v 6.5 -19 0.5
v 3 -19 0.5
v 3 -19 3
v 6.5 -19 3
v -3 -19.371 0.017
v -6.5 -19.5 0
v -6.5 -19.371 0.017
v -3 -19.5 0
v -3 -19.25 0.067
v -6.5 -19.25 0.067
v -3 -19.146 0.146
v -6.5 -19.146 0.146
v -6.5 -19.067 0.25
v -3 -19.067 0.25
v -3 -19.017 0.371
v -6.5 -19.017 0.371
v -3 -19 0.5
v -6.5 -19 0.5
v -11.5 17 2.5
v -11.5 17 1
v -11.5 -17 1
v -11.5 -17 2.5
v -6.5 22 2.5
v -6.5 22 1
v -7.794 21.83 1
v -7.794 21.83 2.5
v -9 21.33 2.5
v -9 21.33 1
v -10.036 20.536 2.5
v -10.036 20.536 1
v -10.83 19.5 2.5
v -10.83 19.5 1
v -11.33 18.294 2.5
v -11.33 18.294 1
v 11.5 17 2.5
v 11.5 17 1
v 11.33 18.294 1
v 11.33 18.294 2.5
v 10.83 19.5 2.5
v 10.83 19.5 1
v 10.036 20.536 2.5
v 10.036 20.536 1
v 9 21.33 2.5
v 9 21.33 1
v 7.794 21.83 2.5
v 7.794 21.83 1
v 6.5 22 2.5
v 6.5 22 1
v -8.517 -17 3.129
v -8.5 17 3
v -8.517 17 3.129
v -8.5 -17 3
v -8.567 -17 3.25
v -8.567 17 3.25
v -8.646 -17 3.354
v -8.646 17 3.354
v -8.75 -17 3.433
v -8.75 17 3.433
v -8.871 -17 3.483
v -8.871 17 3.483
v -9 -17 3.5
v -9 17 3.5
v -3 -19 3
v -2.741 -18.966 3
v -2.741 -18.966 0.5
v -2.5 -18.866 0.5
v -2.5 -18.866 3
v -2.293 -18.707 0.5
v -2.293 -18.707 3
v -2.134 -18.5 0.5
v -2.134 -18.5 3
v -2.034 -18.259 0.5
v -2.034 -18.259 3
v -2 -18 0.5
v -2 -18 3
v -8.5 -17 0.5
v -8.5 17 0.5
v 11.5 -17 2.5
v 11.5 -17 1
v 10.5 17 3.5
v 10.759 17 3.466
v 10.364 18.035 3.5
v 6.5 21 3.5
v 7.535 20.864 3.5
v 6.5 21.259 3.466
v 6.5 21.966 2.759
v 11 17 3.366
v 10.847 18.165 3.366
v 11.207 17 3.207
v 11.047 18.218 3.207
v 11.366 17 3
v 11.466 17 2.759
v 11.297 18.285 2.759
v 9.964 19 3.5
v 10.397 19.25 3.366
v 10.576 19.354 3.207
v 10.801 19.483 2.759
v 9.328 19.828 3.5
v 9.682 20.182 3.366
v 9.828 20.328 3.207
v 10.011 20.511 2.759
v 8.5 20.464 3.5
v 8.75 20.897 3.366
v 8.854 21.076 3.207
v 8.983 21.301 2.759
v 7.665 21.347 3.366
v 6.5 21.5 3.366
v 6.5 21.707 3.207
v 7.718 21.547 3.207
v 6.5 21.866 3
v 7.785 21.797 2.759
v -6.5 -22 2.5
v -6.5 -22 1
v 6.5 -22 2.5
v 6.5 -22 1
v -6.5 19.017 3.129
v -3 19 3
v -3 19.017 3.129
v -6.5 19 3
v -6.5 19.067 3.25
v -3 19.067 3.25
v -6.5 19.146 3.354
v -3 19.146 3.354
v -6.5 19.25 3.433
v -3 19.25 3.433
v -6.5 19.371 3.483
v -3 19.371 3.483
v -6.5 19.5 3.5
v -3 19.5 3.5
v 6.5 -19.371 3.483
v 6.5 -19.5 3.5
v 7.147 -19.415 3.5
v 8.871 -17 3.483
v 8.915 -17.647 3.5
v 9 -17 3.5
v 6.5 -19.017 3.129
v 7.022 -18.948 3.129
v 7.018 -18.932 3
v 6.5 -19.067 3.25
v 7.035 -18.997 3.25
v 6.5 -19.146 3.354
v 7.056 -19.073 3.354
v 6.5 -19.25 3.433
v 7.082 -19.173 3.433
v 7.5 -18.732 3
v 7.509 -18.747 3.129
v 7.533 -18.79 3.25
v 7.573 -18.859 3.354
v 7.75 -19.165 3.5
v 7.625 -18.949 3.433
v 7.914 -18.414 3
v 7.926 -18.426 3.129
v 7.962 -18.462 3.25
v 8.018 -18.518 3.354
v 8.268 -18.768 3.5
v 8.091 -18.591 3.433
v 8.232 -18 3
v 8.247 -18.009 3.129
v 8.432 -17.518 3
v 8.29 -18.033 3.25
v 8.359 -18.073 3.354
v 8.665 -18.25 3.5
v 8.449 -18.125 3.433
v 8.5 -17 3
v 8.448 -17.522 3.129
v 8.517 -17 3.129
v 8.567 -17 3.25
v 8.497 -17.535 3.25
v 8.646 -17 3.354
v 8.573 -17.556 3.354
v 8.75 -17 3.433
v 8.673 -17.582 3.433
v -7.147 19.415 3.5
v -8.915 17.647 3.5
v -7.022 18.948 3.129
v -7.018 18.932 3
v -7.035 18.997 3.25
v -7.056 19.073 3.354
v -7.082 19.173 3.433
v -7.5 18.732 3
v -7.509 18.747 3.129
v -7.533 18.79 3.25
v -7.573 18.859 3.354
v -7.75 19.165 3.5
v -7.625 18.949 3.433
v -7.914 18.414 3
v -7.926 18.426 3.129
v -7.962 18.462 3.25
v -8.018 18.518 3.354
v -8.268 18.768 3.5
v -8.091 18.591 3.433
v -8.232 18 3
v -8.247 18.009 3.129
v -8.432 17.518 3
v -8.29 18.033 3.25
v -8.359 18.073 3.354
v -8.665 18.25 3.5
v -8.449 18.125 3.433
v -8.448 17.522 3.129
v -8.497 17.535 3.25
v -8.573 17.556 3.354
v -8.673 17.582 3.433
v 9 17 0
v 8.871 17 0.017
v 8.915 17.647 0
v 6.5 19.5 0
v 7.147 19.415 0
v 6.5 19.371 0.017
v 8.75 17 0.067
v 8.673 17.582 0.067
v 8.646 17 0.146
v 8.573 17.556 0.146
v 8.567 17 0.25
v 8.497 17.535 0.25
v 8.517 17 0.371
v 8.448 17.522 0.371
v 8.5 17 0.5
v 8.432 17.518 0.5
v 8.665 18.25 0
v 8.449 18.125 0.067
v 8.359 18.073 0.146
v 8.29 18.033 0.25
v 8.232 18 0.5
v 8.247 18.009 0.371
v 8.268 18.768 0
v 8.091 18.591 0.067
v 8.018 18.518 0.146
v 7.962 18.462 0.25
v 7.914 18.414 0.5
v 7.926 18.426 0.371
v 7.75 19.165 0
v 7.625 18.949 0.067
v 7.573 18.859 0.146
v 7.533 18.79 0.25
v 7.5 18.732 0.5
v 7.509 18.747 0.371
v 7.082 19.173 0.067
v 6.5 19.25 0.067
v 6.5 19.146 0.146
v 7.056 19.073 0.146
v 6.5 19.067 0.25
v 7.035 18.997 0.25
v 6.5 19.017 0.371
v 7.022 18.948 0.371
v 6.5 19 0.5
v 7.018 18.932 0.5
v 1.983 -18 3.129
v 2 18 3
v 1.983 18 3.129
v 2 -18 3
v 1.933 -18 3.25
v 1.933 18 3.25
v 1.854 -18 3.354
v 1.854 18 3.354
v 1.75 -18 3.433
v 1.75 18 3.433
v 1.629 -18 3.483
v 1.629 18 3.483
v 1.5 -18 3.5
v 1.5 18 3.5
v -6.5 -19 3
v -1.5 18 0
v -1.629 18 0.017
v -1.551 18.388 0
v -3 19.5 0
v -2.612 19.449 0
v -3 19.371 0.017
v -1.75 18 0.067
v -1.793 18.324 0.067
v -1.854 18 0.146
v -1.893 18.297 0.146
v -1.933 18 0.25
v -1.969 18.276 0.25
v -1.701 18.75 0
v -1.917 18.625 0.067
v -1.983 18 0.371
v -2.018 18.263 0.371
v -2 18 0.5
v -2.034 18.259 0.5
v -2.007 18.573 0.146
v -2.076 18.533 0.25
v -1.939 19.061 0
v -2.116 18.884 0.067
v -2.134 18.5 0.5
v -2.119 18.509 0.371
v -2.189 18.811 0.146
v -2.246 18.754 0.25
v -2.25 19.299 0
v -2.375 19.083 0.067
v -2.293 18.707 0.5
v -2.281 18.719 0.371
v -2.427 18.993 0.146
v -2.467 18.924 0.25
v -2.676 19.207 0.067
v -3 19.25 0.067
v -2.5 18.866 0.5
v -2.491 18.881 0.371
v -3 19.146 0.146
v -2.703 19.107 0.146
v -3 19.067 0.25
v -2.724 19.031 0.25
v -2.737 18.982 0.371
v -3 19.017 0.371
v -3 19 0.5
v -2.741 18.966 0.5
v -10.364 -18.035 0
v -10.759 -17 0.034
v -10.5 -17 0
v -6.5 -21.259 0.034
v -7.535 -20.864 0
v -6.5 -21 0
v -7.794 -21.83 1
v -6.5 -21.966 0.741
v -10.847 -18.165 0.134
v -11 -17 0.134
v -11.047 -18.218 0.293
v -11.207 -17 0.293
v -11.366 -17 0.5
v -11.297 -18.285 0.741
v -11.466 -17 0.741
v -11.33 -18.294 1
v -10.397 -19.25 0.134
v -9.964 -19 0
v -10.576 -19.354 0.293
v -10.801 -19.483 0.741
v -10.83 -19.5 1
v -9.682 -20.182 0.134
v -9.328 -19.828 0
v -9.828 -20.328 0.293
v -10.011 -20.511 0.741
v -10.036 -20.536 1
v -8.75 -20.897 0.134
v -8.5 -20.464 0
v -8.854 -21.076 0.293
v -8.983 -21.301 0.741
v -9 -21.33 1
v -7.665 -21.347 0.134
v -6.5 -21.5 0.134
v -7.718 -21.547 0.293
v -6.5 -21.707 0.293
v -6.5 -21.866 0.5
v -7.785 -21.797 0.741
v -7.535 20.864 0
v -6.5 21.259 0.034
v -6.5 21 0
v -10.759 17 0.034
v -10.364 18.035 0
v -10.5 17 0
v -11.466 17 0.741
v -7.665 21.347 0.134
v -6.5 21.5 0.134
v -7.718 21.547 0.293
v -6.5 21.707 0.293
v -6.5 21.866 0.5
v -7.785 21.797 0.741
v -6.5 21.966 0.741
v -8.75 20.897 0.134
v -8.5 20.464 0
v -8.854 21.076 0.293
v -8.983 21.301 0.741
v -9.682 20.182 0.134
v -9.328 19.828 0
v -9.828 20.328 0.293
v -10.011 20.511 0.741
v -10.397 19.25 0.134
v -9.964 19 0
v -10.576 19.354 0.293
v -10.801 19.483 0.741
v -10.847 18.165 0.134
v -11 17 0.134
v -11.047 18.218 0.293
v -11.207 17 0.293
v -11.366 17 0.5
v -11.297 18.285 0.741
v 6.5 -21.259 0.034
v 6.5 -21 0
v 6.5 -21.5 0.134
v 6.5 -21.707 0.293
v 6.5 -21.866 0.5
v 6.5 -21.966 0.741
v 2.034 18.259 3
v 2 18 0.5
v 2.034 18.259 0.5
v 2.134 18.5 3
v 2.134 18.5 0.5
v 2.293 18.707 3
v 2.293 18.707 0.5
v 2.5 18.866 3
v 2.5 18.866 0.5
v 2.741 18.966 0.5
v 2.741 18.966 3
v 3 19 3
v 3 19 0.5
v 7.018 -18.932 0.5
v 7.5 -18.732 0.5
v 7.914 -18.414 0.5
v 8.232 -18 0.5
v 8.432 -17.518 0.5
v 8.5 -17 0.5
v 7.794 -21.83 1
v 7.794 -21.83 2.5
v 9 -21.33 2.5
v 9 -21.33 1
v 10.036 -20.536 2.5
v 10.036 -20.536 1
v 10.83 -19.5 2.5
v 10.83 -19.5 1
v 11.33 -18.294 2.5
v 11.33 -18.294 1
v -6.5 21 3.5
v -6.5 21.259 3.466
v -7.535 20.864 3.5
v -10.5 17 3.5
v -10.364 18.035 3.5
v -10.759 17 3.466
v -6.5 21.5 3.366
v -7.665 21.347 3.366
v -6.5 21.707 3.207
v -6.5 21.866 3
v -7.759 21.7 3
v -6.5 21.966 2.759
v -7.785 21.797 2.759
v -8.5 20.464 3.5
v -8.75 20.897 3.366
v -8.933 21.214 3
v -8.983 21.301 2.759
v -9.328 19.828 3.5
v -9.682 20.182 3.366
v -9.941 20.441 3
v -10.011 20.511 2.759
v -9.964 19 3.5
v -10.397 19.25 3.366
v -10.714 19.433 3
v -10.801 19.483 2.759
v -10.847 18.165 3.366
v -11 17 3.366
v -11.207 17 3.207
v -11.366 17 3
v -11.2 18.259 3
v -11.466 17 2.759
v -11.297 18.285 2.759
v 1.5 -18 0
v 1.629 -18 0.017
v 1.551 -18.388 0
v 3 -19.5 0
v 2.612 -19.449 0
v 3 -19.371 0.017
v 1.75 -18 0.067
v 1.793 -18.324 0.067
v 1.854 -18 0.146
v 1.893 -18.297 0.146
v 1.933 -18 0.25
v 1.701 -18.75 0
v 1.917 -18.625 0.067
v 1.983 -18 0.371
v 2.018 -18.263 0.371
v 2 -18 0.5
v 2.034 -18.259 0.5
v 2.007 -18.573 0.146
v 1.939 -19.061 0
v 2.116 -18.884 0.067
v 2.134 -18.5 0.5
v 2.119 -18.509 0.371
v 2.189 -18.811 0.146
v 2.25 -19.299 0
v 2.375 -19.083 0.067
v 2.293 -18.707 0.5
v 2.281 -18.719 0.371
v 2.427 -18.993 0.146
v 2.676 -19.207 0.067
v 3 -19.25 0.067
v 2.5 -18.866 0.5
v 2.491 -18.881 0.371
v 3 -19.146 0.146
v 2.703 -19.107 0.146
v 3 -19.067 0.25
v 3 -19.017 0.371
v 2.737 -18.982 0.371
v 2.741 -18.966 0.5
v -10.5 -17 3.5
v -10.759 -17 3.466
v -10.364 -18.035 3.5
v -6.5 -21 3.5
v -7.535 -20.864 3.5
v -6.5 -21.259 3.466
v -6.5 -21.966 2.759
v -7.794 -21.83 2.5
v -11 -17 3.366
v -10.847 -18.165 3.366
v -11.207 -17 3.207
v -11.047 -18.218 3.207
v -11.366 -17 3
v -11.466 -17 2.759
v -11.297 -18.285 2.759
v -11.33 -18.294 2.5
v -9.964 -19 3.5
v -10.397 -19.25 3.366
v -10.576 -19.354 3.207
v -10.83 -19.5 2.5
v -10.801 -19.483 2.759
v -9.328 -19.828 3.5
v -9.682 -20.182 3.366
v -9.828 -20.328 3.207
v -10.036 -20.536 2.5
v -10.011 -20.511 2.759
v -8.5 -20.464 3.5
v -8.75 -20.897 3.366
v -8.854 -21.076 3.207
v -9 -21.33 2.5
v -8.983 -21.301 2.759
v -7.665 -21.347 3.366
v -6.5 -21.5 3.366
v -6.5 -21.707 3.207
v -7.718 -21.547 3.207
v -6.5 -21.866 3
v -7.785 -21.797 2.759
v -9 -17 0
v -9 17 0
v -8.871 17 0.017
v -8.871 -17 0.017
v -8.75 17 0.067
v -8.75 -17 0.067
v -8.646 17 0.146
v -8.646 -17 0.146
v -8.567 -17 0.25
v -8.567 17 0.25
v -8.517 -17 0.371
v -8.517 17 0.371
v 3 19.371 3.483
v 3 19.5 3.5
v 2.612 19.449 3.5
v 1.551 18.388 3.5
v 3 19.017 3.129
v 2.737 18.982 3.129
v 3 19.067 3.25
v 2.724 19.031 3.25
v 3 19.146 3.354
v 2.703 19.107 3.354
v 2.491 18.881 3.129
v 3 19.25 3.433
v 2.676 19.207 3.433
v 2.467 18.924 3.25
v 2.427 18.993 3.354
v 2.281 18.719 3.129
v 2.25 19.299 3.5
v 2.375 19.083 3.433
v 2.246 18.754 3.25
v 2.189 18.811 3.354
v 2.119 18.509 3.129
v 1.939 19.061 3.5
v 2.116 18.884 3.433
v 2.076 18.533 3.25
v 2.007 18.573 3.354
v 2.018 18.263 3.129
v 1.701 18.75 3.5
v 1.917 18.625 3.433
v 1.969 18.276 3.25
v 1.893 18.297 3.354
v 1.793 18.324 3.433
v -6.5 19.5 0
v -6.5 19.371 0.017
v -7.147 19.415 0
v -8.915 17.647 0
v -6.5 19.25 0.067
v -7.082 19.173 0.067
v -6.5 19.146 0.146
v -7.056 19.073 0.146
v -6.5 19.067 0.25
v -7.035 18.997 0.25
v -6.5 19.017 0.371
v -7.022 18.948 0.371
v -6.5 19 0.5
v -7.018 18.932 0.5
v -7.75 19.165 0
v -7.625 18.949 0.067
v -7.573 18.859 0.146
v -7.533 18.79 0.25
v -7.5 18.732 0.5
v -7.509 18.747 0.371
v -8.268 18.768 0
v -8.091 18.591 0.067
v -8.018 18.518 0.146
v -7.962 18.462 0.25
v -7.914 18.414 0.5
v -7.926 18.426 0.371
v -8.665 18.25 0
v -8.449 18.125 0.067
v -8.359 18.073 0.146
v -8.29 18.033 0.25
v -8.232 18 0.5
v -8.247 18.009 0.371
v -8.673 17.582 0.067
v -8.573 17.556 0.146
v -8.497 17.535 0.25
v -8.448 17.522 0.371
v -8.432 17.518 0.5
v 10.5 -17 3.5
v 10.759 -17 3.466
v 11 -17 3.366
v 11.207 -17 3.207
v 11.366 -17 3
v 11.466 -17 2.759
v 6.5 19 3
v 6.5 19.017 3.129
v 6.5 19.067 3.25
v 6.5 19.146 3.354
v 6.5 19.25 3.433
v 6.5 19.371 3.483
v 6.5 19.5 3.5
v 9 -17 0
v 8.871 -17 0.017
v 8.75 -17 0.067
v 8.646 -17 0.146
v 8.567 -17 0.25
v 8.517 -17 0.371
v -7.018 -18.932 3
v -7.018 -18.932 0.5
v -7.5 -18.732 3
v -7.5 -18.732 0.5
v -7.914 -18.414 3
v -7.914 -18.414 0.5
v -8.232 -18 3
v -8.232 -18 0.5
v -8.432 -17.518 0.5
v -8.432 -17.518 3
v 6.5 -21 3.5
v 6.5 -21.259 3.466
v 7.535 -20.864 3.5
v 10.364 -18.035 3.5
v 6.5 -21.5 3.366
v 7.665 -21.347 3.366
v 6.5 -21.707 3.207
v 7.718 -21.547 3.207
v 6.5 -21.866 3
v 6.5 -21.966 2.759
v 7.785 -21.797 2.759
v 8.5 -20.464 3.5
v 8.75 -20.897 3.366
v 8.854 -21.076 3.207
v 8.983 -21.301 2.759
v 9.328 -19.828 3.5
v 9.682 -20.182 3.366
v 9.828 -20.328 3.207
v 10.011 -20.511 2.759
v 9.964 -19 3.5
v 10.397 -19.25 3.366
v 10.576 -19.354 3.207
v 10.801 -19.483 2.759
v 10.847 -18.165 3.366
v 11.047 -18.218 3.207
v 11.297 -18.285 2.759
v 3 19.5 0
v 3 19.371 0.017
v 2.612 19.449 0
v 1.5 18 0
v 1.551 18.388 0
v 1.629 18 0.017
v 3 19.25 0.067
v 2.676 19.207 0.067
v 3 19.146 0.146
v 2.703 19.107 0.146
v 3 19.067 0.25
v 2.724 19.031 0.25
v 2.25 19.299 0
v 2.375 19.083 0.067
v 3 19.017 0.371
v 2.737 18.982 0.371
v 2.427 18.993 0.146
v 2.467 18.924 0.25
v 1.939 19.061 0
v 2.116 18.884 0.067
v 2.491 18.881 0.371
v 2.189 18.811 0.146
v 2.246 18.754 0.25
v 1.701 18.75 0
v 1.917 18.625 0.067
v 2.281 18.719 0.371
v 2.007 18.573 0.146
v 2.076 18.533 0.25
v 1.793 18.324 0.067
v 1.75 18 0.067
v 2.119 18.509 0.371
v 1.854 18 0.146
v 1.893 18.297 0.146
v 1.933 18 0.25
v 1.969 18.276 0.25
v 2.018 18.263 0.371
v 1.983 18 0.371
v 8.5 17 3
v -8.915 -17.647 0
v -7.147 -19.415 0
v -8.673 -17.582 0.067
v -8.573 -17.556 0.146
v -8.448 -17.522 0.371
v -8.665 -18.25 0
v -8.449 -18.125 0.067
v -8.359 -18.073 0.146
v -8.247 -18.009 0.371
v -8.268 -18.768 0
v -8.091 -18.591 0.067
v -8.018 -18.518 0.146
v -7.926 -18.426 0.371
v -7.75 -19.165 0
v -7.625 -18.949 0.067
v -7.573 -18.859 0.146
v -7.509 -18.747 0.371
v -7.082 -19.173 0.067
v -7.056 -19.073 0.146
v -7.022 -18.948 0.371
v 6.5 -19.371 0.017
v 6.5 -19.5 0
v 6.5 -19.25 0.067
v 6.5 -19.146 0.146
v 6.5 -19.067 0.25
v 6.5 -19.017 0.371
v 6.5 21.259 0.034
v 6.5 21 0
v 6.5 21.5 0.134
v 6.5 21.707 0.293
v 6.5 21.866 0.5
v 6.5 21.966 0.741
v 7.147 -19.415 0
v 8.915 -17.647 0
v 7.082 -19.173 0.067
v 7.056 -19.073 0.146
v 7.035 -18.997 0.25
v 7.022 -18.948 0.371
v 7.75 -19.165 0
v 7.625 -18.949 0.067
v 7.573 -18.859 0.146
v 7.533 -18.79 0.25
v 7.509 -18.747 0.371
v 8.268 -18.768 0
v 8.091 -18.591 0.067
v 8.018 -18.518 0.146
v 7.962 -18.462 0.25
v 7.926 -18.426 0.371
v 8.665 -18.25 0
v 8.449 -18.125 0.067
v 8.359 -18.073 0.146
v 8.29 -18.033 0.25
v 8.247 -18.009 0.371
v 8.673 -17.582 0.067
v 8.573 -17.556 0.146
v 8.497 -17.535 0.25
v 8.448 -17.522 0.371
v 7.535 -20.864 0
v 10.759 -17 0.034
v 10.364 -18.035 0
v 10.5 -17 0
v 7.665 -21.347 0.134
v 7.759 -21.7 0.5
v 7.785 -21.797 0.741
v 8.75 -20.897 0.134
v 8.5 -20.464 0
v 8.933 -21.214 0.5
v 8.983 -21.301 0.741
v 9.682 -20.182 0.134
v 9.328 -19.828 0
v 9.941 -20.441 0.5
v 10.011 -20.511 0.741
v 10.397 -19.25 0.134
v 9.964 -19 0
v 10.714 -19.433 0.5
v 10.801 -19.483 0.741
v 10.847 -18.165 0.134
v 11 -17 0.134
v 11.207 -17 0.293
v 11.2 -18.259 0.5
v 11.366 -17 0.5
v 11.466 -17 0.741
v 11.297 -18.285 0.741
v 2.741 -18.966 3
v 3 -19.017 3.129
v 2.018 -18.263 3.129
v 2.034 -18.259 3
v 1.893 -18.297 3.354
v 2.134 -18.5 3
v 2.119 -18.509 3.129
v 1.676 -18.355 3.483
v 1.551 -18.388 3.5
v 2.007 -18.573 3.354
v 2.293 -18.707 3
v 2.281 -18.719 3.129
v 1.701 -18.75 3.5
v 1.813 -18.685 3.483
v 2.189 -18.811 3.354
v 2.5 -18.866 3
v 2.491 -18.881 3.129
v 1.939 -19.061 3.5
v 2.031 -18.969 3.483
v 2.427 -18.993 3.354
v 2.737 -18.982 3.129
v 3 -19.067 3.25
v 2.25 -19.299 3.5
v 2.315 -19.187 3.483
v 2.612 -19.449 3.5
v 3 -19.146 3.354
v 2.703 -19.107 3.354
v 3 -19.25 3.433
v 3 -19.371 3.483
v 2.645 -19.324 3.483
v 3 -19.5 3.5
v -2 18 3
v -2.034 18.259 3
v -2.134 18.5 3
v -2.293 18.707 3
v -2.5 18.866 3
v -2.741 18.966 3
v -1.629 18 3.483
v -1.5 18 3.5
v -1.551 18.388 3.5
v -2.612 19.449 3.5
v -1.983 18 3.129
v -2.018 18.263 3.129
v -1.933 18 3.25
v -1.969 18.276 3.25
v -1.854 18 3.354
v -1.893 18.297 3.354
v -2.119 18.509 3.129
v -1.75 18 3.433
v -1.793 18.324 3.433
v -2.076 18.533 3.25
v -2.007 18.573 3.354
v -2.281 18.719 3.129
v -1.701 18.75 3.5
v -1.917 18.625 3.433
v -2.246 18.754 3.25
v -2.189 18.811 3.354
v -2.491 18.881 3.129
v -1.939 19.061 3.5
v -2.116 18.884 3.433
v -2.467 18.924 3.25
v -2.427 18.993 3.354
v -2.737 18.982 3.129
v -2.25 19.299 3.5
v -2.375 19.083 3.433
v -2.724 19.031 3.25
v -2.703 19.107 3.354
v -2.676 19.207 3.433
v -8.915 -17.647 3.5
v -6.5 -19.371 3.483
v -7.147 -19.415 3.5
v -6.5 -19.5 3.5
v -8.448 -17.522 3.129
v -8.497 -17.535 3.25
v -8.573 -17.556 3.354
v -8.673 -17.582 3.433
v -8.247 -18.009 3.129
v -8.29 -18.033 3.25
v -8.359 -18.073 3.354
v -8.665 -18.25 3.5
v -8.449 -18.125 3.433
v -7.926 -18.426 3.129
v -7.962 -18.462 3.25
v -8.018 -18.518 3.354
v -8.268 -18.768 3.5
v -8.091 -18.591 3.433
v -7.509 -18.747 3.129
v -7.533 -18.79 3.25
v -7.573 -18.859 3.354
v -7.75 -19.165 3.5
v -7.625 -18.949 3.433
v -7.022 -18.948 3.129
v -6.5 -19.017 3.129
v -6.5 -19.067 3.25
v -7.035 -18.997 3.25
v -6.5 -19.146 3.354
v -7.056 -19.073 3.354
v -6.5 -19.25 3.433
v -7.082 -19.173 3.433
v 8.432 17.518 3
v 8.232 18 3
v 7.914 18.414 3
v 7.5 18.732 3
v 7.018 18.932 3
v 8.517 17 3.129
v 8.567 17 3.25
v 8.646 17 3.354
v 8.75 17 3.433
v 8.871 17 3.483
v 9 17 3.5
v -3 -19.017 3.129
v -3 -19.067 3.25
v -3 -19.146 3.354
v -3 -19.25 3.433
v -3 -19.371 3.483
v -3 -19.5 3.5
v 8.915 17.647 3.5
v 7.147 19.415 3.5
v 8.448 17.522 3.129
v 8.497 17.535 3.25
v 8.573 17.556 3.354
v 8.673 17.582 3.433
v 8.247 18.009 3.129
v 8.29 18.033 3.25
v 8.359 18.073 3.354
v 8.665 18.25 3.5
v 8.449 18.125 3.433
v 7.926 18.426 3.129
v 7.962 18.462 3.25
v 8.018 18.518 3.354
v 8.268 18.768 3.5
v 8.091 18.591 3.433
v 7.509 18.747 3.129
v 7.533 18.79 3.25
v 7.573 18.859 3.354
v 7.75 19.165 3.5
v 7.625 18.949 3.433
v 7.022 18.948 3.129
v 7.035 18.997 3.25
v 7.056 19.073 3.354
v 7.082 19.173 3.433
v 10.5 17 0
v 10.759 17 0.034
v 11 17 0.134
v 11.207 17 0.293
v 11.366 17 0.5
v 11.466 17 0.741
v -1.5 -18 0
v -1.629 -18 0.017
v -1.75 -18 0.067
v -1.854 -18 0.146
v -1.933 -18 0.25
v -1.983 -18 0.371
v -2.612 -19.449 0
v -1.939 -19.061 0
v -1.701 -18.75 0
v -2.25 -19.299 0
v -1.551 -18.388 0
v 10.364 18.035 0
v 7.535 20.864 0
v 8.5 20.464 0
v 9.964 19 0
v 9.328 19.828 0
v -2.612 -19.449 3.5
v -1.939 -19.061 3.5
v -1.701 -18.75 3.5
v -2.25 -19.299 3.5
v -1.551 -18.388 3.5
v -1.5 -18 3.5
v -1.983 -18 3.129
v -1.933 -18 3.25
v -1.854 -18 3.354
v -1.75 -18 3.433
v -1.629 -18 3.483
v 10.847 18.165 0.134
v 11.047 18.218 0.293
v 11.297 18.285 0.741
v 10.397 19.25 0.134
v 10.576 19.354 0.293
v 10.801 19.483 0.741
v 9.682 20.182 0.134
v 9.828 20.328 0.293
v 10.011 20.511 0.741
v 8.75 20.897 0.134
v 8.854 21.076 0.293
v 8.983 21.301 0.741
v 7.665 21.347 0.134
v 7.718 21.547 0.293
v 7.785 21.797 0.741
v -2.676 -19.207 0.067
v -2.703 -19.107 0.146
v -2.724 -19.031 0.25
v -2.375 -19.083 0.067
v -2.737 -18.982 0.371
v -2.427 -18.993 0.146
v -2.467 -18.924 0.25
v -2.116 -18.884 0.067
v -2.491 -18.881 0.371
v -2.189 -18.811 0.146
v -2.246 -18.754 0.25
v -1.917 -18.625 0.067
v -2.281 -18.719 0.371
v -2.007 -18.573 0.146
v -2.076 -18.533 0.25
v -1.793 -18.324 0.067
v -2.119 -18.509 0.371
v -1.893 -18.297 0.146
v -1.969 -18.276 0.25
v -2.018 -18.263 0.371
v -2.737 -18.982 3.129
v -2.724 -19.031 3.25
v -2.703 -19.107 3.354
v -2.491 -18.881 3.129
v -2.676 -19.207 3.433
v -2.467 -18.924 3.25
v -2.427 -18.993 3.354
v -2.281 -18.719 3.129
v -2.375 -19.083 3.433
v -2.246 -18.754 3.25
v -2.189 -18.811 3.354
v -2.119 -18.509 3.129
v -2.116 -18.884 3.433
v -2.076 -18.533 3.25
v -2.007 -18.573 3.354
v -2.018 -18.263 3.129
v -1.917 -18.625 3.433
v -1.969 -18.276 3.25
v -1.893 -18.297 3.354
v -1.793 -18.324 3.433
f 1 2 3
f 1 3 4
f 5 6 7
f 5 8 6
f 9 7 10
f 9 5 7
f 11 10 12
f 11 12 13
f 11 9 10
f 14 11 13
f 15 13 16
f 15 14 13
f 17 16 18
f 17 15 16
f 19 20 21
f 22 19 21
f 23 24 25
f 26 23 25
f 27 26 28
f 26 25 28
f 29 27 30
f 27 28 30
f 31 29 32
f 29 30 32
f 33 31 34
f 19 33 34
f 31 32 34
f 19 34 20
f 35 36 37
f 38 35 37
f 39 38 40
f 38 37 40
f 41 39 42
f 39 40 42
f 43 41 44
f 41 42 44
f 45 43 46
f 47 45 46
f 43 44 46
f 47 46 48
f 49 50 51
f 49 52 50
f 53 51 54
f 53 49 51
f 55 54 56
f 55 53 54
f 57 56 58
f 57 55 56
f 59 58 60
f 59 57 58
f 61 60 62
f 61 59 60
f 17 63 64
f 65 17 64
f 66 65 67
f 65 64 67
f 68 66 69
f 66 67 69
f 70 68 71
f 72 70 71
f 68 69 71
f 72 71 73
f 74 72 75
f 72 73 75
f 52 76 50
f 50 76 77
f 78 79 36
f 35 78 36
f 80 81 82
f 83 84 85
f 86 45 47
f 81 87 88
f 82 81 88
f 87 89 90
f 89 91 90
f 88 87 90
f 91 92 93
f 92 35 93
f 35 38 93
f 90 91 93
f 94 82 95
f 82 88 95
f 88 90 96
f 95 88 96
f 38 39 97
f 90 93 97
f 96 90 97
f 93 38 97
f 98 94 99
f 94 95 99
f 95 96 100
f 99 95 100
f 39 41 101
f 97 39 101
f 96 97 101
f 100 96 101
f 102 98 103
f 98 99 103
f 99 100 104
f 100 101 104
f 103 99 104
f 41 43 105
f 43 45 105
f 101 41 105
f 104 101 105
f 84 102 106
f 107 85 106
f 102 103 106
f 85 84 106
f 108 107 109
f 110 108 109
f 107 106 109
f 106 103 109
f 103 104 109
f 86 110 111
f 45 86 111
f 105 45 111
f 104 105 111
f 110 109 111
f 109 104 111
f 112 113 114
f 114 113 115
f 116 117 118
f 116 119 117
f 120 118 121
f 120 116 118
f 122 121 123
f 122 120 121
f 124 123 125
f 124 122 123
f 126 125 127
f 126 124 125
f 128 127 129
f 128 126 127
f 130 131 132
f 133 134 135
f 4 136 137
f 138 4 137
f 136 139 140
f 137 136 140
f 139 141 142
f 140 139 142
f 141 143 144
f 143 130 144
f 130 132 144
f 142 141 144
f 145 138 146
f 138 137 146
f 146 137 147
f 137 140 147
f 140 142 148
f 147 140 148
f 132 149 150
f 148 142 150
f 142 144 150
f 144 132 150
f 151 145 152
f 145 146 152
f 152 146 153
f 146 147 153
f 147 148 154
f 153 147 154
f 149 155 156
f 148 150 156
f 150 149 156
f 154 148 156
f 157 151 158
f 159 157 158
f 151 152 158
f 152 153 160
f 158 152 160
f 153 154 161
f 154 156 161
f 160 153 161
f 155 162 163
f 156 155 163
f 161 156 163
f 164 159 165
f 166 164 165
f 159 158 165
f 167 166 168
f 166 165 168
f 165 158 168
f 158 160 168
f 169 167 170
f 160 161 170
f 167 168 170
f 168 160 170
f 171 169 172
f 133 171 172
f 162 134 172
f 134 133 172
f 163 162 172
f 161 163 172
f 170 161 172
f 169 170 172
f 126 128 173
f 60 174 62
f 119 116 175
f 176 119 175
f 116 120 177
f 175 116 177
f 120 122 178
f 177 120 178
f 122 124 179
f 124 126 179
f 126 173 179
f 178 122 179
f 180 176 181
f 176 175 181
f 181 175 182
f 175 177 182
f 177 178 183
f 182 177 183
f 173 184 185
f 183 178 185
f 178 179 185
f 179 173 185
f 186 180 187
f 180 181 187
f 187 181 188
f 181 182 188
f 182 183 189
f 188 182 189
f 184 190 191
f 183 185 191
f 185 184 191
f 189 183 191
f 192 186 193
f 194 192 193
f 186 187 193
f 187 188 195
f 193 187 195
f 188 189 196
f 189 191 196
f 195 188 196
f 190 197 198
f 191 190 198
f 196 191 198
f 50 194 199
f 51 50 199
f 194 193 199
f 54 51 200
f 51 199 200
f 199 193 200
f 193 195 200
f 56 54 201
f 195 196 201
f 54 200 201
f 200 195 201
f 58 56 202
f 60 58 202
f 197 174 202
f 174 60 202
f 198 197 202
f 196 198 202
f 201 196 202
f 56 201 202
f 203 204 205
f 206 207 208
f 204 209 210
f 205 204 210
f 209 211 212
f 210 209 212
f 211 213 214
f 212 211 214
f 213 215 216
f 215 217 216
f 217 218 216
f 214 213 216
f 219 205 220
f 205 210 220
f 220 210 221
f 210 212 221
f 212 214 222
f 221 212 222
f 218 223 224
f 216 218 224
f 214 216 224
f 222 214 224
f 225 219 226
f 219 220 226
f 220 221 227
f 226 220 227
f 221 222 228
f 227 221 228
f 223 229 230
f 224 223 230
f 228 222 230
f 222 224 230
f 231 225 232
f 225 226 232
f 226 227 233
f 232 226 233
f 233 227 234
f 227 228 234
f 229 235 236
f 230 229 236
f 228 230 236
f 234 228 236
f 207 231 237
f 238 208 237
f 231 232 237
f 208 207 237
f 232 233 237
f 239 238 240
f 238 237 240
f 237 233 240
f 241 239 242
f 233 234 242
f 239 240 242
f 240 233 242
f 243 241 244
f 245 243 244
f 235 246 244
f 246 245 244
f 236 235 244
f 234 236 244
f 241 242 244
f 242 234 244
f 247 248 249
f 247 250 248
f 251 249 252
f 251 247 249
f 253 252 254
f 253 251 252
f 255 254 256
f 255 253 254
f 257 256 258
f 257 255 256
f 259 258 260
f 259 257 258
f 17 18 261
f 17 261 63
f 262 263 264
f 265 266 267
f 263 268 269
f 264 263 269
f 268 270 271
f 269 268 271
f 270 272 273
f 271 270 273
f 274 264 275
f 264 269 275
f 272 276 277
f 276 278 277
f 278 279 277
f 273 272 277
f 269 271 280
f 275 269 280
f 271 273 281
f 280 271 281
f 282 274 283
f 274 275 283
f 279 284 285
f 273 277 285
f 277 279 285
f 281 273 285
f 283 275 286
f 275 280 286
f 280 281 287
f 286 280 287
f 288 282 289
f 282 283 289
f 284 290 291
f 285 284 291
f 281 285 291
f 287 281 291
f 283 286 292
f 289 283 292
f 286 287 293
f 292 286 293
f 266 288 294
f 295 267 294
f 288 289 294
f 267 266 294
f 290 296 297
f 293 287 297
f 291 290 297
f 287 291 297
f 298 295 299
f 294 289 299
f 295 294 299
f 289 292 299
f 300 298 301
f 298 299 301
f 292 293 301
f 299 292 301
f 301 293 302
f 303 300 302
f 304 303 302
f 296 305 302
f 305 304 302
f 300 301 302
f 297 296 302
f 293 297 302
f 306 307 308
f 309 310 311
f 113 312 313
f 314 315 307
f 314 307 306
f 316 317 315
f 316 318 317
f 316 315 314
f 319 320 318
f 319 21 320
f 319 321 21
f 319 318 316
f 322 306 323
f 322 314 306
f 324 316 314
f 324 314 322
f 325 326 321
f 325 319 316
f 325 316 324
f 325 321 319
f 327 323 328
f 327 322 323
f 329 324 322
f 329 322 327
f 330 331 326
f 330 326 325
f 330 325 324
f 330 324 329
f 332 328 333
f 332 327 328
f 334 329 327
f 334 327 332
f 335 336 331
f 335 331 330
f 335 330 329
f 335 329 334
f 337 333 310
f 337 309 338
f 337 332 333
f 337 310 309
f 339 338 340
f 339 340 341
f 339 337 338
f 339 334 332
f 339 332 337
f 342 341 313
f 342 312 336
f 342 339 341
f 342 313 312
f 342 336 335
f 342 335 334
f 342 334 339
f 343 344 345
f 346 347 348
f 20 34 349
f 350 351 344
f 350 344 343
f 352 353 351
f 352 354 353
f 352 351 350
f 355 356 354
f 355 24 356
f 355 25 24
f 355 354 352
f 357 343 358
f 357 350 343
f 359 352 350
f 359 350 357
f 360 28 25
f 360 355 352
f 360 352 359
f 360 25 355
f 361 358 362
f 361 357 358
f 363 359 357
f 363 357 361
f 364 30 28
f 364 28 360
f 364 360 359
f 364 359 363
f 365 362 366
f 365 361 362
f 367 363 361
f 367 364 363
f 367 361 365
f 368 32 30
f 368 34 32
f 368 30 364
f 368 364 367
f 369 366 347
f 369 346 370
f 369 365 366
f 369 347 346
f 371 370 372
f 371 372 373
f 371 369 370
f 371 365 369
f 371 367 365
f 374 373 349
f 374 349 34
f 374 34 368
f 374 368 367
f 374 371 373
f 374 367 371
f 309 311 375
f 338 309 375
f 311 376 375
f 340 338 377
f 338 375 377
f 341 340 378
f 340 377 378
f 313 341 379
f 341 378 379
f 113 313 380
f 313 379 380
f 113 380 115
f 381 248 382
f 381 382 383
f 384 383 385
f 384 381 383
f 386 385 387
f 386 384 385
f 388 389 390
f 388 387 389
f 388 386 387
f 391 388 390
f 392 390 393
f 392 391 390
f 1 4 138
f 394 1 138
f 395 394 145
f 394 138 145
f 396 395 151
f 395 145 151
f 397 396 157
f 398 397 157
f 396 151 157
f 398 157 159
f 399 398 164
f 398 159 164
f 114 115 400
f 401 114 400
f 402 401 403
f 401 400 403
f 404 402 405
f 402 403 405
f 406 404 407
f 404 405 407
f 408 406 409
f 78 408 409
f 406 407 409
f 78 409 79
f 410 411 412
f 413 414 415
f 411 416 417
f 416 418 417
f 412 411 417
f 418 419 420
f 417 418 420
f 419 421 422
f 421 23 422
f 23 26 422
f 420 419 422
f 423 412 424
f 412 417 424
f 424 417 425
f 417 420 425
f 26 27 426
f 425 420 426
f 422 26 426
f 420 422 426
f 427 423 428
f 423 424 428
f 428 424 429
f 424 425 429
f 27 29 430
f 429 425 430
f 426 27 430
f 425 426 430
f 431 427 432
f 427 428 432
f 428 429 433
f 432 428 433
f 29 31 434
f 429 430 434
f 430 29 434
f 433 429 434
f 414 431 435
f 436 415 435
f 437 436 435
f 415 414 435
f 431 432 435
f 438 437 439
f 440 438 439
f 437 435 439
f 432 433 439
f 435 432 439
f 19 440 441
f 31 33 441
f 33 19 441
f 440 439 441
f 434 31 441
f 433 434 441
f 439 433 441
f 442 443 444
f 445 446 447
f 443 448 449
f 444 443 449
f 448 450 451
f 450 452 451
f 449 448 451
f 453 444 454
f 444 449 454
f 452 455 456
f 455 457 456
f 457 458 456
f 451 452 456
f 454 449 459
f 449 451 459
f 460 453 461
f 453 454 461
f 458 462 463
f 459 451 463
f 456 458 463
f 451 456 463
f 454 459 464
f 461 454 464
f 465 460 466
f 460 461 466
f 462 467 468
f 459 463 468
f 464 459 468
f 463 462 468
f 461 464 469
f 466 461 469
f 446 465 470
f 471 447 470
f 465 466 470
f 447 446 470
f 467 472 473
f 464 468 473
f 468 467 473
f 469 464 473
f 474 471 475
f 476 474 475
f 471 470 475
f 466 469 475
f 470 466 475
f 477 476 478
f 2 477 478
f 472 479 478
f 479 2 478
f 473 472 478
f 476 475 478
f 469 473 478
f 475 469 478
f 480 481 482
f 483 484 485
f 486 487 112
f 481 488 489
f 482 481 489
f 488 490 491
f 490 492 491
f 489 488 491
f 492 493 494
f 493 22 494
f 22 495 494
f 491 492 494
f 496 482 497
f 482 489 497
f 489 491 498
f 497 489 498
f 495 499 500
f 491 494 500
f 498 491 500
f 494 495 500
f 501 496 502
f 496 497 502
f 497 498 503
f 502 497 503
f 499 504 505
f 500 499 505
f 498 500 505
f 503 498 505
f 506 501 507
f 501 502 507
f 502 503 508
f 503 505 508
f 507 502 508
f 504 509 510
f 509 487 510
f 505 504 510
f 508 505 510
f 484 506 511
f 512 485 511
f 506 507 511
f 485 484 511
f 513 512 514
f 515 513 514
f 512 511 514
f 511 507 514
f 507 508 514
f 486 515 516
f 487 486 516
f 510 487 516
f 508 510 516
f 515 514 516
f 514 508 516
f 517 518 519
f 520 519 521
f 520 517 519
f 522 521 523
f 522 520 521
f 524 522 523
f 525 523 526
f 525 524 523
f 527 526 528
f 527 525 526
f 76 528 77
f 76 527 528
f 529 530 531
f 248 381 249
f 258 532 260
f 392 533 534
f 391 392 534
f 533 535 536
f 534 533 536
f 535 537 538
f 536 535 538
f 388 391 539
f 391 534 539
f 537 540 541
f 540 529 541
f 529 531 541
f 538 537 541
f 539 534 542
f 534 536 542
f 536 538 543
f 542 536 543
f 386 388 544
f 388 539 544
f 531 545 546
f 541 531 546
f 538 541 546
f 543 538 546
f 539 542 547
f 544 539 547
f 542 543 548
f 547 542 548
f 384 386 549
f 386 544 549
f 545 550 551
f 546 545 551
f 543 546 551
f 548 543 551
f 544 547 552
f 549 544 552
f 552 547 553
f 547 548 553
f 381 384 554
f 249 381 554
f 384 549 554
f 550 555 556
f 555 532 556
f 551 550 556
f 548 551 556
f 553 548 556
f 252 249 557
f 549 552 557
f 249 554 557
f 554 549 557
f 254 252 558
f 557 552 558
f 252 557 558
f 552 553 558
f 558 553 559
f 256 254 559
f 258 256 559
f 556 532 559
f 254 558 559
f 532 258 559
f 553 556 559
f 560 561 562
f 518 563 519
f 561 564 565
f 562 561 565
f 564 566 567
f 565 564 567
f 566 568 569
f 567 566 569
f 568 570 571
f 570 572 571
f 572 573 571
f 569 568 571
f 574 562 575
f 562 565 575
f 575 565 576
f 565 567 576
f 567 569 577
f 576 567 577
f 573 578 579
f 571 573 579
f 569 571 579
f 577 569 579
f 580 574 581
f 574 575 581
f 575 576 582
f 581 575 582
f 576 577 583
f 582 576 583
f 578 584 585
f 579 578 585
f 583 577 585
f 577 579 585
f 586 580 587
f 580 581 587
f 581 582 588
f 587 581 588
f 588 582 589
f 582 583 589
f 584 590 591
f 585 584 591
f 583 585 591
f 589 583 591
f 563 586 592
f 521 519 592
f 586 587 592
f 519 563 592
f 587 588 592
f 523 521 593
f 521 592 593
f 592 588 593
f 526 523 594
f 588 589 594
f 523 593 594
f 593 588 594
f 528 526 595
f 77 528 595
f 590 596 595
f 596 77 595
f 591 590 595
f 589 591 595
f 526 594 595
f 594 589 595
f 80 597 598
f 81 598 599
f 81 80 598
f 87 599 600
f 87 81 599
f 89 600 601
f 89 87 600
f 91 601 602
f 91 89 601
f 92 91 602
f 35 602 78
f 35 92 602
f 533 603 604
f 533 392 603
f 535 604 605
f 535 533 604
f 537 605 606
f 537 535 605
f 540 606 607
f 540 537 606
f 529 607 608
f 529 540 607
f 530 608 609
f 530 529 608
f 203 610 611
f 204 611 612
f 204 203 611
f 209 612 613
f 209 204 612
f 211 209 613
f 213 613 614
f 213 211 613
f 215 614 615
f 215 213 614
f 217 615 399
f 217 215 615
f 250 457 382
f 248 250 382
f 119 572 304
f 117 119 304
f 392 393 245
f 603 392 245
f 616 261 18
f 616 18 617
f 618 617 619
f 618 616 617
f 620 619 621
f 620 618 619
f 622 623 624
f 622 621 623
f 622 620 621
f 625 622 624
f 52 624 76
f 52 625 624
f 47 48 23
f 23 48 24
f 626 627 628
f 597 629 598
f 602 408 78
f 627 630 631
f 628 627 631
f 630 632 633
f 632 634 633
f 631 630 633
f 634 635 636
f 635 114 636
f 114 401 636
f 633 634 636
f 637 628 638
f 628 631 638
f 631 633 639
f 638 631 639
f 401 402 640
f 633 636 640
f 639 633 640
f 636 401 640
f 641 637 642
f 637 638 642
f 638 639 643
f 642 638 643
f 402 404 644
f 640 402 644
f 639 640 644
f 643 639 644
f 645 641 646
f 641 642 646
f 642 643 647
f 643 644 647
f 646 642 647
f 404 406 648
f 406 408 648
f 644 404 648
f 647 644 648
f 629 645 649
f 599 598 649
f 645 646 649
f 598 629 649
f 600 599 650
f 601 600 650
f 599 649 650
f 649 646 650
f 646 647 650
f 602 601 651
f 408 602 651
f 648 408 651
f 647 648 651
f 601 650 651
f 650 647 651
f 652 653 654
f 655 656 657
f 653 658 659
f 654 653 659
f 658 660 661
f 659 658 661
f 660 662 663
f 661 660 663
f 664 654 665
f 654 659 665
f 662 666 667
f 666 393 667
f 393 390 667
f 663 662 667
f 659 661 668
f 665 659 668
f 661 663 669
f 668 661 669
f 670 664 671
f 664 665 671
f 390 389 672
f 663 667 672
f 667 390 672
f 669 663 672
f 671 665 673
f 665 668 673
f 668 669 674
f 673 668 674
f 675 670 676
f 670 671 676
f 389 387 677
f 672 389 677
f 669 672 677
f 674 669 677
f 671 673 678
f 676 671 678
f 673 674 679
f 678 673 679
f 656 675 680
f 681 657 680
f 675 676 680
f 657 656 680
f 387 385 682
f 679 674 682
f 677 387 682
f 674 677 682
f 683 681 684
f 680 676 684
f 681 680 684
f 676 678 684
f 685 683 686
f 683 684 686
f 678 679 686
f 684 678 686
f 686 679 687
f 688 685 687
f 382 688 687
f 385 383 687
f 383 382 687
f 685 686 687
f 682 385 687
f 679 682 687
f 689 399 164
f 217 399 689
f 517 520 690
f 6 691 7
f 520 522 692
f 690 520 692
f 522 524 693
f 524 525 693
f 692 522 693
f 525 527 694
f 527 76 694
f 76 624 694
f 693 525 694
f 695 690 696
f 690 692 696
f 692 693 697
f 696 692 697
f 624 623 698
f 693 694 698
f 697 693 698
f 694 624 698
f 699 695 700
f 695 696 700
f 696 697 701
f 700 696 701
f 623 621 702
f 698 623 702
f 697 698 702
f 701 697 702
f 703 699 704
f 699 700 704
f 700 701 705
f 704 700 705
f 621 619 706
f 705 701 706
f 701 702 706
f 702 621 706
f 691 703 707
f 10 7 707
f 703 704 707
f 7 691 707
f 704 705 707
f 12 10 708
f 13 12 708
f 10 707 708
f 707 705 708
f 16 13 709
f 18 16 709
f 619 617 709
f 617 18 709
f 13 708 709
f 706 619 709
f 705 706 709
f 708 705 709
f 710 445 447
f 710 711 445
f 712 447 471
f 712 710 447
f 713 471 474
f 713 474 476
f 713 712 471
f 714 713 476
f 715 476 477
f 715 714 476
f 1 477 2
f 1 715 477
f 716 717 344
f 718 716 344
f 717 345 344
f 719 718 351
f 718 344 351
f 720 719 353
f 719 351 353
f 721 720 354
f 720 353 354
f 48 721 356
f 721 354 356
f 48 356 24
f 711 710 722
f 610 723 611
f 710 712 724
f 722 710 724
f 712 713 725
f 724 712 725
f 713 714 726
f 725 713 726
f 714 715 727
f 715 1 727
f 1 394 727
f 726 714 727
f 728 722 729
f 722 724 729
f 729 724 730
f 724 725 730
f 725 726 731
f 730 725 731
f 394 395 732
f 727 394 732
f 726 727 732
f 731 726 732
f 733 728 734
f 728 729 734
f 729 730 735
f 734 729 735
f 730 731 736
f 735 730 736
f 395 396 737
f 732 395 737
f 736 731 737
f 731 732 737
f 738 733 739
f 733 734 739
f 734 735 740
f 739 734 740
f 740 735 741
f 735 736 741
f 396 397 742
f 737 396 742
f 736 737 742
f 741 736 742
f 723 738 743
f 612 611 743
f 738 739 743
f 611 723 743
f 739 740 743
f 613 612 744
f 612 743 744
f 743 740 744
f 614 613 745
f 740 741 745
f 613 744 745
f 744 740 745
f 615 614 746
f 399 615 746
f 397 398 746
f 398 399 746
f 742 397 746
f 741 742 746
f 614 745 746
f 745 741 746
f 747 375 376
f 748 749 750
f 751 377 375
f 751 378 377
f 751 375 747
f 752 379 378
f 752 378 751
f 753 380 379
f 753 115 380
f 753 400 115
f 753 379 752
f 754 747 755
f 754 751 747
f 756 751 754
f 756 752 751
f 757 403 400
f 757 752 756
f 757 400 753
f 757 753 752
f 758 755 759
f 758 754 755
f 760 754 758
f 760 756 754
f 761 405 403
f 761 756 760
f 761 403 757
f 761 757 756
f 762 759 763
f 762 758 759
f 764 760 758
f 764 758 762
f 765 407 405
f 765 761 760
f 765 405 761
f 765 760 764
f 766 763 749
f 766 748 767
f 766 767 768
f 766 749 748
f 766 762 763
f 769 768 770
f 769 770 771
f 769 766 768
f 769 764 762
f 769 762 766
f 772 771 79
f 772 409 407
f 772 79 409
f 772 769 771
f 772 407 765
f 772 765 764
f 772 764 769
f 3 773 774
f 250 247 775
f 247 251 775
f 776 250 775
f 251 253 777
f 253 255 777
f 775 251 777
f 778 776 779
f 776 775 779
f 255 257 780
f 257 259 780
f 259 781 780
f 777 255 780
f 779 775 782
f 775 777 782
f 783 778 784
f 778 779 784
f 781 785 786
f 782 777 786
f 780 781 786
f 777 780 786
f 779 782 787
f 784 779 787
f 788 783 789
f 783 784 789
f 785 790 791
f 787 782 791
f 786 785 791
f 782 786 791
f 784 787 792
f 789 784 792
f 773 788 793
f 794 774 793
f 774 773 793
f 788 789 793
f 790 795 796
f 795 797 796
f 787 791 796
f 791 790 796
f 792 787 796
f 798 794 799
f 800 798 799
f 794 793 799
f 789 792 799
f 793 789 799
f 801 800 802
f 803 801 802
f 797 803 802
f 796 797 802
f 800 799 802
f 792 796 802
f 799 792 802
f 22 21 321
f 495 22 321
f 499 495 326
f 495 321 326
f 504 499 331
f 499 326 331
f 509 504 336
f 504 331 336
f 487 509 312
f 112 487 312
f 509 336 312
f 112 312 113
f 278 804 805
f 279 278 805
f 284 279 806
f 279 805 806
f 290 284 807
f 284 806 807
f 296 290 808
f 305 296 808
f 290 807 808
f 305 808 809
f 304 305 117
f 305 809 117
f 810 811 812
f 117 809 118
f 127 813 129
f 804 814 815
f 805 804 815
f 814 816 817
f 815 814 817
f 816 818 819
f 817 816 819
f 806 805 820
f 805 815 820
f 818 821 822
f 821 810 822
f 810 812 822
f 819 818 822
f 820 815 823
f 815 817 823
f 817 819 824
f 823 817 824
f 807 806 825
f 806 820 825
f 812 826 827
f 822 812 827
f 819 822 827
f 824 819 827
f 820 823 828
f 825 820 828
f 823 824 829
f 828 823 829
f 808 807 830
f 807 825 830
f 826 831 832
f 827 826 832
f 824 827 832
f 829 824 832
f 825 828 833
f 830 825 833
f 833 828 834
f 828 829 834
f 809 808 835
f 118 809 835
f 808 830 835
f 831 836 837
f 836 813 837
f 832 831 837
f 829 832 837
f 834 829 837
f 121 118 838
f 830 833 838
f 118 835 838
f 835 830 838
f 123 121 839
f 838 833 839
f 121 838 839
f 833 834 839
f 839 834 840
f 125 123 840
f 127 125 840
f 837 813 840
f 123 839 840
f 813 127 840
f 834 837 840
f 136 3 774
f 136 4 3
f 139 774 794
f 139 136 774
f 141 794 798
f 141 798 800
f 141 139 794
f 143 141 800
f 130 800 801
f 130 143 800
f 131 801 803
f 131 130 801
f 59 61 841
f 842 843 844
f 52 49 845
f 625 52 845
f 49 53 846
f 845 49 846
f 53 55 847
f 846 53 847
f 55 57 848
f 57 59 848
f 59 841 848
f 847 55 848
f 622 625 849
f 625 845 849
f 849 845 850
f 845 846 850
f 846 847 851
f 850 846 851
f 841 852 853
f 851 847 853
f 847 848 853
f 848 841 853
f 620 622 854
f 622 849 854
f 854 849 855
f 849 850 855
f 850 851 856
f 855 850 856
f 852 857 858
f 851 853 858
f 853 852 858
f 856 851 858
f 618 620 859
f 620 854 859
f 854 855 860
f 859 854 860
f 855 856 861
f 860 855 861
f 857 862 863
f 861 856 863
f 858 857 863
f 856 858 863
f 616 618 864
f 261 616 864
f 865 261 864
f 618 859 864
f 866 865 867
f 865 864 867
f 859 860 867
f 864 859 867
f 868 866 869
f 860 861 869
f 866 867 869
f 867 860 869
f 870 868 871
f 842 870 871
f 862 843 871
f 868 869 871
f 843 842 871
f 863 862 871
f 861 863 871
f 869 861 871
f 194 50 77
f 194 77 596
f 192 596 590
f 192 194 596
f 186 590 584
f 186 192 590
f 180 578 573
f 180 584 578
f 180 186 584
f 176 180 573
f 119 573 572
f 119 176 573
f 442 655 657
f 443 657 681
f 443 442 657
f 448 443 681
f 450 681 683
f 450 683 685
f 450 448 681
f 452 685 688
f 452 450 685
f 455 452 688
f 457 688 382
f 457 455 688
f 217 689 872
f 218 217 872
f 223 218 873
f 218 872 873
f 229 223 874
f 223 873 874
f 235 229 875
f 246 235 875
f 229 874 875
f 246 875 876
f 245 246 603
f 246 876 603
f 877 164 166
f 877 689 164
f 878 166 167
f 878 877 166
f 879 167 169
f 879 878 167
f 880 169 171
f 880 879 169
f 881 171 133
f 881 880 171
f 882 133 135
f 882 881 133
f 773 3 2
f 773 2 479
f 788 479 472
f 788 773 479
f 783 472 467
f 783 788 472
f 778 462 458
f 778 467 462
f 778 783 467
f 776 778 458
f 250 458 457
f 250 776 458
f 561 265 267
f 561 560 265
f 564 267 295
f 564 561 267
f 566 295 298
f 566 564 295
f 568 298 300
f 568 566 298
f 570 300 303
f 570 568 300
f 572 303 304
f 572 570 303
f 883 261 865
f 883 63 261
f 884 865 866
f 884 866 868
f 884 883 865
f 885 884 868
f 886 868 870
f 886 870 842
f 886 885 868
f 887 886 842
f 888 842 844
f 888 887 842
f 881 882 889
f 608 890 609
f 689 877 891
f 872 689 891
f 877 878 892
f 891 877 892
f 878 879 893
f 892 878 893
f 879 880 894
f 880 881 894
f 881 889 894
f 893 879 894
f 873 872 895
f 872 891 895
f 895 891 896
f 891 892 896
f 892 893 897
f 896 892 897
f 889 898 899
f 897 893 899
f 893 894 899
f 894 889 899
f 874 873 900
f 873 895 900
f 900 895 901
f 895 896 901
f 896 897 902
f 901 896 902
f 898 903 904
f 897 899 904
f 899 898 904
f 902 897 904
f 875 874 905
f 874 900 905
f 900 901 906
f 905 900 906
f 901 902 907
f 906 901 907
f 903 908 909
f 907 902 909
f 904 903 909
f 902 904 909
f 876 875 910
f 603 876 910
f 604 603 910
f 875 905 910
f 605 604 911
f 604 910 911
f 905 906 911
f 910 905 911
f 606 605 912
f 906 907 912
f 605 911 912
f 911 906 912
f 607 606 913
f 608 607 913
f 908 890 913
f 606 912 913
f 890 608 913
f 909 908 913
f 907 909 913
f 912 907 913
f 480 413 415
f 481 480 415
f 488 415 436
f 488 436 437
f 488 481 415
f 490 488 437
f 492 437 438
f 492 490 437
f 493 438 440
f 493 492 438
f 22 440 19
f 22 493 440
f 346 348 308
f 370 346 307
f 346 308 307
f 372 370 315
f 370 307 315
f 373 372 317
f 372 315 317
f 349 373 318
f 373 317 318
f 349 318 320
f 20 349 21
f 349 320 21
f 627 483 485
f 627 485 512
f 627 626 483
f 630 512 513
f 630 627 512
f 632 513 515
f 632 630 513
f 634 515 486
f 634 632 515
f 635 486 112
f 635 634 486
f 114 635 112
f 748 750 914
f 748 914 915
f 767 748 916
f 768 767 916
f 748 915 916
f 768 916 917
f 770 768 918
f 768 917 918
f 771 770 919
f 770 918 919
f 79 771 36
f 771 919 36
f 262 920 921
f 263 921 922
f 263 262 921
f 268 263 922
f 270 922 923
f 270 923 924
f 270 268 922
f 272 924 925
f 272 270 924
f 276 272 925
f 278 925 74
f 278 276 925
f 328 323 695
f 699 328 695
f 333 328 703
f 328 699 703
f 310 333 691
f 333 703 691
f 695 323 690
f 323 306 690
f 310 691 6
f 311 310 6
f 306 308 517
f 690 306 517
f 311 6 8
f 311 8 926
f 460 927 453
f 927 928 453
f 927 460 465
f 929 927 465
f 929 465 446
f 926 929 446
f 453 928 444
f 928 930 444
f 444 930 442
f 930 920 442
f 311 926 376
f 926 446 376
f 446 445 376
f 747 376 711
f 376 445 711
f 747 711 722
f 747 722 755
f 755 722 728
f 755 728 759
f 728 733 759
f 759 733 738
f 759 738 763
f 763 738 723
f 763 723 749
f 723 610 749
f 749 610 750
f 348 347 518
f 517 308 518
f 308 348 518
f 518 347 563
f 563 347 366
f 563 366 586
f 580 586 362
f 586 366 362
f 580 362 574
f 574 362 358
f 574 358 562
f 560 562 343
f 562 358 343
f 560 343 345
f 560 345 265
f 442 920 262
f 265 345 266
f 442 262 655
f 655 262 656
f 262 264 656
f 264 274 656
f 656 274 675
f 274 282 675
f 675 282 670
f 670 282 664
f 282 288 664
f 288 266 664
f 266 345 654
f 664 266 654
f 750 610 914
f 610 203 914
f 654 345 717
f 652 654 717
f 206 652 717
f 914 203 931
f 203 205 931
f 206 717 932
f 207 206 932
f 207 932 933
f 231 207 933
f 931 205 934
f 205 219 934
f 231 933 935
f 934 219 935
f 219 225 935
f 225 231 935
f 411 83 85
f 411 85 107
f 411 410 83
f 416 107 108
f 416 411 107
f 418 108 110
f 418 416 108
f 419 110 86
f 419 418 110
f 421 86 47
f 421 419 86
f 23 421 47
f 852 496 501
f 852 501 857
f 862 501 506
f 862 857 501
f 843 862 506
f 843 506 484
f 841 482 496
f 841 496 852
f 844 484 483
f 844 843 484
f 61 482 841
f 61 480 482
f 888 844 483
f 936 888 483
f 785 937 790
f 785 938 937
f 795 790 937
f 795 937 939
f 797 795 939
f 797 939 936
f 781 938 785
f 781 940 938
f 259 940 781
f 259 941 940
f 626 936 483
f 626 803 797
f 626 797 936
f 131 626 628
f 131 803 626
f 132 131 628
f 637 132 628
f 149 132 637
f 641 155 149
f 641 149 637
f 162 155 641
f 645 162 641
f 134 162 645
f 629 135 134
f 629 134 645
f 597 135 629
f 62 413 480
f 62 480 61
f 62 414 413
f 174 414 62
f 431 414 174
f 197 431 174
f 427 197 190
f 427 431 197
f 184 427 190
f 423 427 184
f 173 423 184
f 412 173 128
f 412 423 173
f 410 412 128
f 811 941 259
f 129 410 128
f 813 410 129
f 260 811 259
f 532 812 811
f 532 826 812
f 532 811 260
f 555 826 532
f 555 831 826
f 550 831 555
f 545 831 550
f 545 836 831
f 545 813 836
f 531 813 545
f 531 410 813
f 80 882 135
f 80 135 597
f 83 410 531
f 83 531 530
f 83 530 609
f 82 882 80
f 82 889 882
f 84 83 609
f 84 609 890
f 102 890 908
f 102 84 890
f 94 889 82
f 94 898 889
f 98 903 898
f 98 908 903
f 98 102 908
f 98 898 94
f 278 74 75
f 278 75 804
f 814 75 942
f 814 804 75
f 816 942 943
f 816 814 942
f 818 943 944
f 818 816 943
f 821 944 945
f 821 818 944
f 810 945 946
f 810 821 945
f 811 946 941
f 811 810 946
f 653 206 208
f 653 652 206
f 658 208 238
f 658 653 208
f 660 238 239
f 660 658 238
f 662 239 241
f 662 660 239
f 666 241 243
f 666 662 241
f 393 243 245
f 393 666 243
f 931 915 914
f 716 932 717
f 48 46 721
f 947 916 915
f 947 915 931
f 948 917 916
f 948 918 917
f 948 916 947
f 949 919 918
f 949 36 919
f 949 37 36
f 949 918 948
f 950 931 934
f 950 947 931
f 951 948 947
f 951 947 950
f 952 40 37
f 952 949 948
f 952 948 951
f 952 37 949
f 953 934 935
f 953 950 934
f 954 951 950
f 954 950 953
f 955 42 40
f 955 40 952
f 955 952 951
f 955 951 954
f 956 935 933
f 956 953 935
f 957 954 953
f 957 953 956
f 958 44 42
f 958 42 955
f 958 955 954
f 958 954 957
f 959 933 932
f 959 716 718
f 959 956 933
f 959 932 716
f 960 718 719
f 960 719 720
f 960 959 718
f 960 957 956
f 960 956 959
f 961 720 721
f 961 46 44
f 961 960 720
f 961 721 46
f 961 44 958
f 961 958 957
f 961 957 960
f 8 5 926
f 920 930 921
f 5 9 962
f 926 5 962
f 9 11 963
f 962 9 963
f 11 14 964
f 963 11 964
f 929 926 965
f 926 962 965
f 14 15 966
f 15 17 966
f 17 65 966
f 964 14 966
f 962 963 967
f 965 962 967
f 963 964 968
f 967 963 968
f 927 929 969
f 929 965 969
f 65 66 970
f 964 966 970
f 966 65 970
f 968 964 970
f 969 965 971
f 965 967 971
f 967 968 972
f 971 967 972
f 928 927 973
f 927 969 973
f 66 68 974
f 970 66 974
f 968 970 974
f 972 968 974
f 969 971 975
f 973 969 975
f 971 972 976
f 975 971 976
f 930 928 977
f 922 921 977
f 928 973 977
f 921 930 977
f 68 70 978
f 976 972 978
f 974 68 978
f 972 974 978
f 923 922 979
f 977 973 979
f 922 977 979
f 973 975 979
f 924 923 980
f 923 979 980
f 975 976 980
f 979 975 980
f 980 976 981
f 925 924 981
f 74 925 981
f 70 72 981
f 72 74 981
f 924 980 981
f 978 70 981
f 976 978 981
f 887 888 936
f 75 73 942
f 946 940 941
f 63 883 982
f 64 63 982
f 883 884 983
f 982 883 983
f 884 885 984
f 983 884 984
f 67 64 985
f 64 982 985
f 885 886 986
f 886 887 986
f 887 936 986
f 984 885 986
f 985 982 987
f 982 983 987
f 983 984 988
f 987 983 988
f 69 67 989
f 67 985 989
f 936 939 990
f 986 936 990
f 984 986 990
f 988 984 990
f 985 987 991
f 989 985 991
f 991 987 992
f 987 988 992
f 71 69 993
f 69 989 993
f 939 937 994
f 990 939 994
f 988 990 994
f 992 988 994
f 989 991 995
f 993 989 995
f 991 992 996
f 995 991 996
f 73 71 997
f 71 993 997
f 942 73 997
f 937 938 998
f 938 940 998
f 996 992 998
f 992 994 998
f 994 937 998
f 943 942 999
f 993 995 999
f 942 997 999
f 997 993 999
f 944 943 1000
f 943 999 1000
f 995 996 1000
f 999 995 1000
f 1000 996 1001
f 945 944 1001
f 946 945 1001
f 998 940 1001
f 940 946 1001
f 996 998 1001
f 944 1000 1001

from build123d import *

# Parameters (mm, degrees)
F0_W     = 6.5
F0_H     = 38
F1_DEPTH = 3.5
F2_R     = 2
F3_R     = 1
F4_R     = 1
F5_R     = 0.5


with BuildPart() as f1:
    # F0 (on Top) → F1 (new body)
    with BuildSketch(Plane.XY):
        with BuildLine():
            Line((6.5, 22), (-6.5, 22))
            ThreePointArc((-6.5, 22), (-10.0355339059, 20.5355339059), (-11.5, 17))
            Line((-11.5, 17), (-11.5, -17))
            ThreePointArc((-11.5, -17), (-10.0355339059, -20.5355339059), (-6.5, -22))
            Line((-6.5, -22), (6.5, -22))
            ThreePointArc((6.5, -22), (10.0355339059, -20.5355339059), (11.5, -17))
            Line((11.5, -17), (11.5, 17))
            ThreePointArc((11.5, 17), (10.0355339059, 20.5355339059), (6.5, 22))
        make_face()
        with Locations((-5.25, 0)):
            Rectangle(F0_W, F0_H, mode=Mode.SUBTRACT)
        with Locations((5.25, 0)):
            Rectangle(F0_W, F0_H, mode=Mode.SUBTRACT)
    extrude(amount=F1_DEPTH)

    # F2
    f2_edges = [f1.edges().sort_by_distance(p)[0] for p in [
        (-8.5, 19, 1.75),
        (8.5, -19, 1.75),
        (8.5, 19, 1.75),
        (-8.5, -19, 1.75),
    ]]
    fillet(f2_edges, radius=F2_R)

    # F3
    f3_edges = [f1.edges().sort_by_distance(p)[0] for p in [
        (2, 19, 1.75),
        (-2, 19, 1.75),
        (-2, -19, 1.75),
        (2, -19, 1.75),
    ]]
    fillet(f3_edges, radius=F3_R)

    # F4
    f4_edges = [f1.edges().sort_by_distance(p)[0] for p in [
        (-11.5, 0, 3.5),
        (11.5, 0, 0),
        (10.035534, 20.535534, 0),
        (0, 22, 0),
        (-10.035534, 20.535534, 0),
        (-11.5, 0, 0),
        (-10.035534, -20.535534, 0),
        (0, -22, 0),
        (10.035534, -20.535534, 0),
        (10.035534, 20.535534, 3.5),
        (0, 22, 3.5),
        (-10.035534, 20.535534, 3.5),
        (-10.035534, -20.535534, 3.5),
        (0, -22, 3.5),
        (10.035534, -20.535534, 3.5),
        (11.5, 0, 3.5),
    ]]
    fillet(f4_edges, radius=F4_R)

    # F5
    f5_edges = [f1.edges().sort_by_distance(p)[0] for p in [
        (4.75, -19, 3.5),
        (-2.292893, -18.707107, 3.5),
        (-4.75, -19, 0),
        (4.75, -19, 0),
        (-2.292893, -18.707107, 0),
        (-7.914214, -18.414214, 0),
        (-2, 0, 0),
        (-8.5, 0, 0),
        (-2.292893, 18.707107, 0),
        (-7.914214, 18.414214, 0),
        (-4.75, 19, 0),
        (4.75, 19, 0),
        (2.292893, 18.707107, 0),
        (7.914214, 18.414214, 0),
        (2, 0, 0),
        (8.5, 0, 0),
        (2.292893, -18.707107, 0),
        (7.914214, -18.414214, 0),
        (-4.75, -19, 3.5),
        (-7.914214, -18.414214, 3.5),
        (-2, 0, 3.5),
        (-8.5, 0, 3.5),
        (-2.292893, 18.707107, 3.5),
        (-7.914214, 18.414214, 3.5),
        (-4.75, 19, 3.5),
        (4.75, 19, 3.5),
        (2.292893, 18.707107, 3.5),
        (7.914214, 18.414214, 3.5),
        (2, 0, 3.5),
        (8.5, 0, 3.5),
        (2.292893, -18.707107, 3.5),
        (7.914214, -18.414214, 3.5),
    ]]
    fillet(f5_edges, radius=F5_R)


solid = f1.part
